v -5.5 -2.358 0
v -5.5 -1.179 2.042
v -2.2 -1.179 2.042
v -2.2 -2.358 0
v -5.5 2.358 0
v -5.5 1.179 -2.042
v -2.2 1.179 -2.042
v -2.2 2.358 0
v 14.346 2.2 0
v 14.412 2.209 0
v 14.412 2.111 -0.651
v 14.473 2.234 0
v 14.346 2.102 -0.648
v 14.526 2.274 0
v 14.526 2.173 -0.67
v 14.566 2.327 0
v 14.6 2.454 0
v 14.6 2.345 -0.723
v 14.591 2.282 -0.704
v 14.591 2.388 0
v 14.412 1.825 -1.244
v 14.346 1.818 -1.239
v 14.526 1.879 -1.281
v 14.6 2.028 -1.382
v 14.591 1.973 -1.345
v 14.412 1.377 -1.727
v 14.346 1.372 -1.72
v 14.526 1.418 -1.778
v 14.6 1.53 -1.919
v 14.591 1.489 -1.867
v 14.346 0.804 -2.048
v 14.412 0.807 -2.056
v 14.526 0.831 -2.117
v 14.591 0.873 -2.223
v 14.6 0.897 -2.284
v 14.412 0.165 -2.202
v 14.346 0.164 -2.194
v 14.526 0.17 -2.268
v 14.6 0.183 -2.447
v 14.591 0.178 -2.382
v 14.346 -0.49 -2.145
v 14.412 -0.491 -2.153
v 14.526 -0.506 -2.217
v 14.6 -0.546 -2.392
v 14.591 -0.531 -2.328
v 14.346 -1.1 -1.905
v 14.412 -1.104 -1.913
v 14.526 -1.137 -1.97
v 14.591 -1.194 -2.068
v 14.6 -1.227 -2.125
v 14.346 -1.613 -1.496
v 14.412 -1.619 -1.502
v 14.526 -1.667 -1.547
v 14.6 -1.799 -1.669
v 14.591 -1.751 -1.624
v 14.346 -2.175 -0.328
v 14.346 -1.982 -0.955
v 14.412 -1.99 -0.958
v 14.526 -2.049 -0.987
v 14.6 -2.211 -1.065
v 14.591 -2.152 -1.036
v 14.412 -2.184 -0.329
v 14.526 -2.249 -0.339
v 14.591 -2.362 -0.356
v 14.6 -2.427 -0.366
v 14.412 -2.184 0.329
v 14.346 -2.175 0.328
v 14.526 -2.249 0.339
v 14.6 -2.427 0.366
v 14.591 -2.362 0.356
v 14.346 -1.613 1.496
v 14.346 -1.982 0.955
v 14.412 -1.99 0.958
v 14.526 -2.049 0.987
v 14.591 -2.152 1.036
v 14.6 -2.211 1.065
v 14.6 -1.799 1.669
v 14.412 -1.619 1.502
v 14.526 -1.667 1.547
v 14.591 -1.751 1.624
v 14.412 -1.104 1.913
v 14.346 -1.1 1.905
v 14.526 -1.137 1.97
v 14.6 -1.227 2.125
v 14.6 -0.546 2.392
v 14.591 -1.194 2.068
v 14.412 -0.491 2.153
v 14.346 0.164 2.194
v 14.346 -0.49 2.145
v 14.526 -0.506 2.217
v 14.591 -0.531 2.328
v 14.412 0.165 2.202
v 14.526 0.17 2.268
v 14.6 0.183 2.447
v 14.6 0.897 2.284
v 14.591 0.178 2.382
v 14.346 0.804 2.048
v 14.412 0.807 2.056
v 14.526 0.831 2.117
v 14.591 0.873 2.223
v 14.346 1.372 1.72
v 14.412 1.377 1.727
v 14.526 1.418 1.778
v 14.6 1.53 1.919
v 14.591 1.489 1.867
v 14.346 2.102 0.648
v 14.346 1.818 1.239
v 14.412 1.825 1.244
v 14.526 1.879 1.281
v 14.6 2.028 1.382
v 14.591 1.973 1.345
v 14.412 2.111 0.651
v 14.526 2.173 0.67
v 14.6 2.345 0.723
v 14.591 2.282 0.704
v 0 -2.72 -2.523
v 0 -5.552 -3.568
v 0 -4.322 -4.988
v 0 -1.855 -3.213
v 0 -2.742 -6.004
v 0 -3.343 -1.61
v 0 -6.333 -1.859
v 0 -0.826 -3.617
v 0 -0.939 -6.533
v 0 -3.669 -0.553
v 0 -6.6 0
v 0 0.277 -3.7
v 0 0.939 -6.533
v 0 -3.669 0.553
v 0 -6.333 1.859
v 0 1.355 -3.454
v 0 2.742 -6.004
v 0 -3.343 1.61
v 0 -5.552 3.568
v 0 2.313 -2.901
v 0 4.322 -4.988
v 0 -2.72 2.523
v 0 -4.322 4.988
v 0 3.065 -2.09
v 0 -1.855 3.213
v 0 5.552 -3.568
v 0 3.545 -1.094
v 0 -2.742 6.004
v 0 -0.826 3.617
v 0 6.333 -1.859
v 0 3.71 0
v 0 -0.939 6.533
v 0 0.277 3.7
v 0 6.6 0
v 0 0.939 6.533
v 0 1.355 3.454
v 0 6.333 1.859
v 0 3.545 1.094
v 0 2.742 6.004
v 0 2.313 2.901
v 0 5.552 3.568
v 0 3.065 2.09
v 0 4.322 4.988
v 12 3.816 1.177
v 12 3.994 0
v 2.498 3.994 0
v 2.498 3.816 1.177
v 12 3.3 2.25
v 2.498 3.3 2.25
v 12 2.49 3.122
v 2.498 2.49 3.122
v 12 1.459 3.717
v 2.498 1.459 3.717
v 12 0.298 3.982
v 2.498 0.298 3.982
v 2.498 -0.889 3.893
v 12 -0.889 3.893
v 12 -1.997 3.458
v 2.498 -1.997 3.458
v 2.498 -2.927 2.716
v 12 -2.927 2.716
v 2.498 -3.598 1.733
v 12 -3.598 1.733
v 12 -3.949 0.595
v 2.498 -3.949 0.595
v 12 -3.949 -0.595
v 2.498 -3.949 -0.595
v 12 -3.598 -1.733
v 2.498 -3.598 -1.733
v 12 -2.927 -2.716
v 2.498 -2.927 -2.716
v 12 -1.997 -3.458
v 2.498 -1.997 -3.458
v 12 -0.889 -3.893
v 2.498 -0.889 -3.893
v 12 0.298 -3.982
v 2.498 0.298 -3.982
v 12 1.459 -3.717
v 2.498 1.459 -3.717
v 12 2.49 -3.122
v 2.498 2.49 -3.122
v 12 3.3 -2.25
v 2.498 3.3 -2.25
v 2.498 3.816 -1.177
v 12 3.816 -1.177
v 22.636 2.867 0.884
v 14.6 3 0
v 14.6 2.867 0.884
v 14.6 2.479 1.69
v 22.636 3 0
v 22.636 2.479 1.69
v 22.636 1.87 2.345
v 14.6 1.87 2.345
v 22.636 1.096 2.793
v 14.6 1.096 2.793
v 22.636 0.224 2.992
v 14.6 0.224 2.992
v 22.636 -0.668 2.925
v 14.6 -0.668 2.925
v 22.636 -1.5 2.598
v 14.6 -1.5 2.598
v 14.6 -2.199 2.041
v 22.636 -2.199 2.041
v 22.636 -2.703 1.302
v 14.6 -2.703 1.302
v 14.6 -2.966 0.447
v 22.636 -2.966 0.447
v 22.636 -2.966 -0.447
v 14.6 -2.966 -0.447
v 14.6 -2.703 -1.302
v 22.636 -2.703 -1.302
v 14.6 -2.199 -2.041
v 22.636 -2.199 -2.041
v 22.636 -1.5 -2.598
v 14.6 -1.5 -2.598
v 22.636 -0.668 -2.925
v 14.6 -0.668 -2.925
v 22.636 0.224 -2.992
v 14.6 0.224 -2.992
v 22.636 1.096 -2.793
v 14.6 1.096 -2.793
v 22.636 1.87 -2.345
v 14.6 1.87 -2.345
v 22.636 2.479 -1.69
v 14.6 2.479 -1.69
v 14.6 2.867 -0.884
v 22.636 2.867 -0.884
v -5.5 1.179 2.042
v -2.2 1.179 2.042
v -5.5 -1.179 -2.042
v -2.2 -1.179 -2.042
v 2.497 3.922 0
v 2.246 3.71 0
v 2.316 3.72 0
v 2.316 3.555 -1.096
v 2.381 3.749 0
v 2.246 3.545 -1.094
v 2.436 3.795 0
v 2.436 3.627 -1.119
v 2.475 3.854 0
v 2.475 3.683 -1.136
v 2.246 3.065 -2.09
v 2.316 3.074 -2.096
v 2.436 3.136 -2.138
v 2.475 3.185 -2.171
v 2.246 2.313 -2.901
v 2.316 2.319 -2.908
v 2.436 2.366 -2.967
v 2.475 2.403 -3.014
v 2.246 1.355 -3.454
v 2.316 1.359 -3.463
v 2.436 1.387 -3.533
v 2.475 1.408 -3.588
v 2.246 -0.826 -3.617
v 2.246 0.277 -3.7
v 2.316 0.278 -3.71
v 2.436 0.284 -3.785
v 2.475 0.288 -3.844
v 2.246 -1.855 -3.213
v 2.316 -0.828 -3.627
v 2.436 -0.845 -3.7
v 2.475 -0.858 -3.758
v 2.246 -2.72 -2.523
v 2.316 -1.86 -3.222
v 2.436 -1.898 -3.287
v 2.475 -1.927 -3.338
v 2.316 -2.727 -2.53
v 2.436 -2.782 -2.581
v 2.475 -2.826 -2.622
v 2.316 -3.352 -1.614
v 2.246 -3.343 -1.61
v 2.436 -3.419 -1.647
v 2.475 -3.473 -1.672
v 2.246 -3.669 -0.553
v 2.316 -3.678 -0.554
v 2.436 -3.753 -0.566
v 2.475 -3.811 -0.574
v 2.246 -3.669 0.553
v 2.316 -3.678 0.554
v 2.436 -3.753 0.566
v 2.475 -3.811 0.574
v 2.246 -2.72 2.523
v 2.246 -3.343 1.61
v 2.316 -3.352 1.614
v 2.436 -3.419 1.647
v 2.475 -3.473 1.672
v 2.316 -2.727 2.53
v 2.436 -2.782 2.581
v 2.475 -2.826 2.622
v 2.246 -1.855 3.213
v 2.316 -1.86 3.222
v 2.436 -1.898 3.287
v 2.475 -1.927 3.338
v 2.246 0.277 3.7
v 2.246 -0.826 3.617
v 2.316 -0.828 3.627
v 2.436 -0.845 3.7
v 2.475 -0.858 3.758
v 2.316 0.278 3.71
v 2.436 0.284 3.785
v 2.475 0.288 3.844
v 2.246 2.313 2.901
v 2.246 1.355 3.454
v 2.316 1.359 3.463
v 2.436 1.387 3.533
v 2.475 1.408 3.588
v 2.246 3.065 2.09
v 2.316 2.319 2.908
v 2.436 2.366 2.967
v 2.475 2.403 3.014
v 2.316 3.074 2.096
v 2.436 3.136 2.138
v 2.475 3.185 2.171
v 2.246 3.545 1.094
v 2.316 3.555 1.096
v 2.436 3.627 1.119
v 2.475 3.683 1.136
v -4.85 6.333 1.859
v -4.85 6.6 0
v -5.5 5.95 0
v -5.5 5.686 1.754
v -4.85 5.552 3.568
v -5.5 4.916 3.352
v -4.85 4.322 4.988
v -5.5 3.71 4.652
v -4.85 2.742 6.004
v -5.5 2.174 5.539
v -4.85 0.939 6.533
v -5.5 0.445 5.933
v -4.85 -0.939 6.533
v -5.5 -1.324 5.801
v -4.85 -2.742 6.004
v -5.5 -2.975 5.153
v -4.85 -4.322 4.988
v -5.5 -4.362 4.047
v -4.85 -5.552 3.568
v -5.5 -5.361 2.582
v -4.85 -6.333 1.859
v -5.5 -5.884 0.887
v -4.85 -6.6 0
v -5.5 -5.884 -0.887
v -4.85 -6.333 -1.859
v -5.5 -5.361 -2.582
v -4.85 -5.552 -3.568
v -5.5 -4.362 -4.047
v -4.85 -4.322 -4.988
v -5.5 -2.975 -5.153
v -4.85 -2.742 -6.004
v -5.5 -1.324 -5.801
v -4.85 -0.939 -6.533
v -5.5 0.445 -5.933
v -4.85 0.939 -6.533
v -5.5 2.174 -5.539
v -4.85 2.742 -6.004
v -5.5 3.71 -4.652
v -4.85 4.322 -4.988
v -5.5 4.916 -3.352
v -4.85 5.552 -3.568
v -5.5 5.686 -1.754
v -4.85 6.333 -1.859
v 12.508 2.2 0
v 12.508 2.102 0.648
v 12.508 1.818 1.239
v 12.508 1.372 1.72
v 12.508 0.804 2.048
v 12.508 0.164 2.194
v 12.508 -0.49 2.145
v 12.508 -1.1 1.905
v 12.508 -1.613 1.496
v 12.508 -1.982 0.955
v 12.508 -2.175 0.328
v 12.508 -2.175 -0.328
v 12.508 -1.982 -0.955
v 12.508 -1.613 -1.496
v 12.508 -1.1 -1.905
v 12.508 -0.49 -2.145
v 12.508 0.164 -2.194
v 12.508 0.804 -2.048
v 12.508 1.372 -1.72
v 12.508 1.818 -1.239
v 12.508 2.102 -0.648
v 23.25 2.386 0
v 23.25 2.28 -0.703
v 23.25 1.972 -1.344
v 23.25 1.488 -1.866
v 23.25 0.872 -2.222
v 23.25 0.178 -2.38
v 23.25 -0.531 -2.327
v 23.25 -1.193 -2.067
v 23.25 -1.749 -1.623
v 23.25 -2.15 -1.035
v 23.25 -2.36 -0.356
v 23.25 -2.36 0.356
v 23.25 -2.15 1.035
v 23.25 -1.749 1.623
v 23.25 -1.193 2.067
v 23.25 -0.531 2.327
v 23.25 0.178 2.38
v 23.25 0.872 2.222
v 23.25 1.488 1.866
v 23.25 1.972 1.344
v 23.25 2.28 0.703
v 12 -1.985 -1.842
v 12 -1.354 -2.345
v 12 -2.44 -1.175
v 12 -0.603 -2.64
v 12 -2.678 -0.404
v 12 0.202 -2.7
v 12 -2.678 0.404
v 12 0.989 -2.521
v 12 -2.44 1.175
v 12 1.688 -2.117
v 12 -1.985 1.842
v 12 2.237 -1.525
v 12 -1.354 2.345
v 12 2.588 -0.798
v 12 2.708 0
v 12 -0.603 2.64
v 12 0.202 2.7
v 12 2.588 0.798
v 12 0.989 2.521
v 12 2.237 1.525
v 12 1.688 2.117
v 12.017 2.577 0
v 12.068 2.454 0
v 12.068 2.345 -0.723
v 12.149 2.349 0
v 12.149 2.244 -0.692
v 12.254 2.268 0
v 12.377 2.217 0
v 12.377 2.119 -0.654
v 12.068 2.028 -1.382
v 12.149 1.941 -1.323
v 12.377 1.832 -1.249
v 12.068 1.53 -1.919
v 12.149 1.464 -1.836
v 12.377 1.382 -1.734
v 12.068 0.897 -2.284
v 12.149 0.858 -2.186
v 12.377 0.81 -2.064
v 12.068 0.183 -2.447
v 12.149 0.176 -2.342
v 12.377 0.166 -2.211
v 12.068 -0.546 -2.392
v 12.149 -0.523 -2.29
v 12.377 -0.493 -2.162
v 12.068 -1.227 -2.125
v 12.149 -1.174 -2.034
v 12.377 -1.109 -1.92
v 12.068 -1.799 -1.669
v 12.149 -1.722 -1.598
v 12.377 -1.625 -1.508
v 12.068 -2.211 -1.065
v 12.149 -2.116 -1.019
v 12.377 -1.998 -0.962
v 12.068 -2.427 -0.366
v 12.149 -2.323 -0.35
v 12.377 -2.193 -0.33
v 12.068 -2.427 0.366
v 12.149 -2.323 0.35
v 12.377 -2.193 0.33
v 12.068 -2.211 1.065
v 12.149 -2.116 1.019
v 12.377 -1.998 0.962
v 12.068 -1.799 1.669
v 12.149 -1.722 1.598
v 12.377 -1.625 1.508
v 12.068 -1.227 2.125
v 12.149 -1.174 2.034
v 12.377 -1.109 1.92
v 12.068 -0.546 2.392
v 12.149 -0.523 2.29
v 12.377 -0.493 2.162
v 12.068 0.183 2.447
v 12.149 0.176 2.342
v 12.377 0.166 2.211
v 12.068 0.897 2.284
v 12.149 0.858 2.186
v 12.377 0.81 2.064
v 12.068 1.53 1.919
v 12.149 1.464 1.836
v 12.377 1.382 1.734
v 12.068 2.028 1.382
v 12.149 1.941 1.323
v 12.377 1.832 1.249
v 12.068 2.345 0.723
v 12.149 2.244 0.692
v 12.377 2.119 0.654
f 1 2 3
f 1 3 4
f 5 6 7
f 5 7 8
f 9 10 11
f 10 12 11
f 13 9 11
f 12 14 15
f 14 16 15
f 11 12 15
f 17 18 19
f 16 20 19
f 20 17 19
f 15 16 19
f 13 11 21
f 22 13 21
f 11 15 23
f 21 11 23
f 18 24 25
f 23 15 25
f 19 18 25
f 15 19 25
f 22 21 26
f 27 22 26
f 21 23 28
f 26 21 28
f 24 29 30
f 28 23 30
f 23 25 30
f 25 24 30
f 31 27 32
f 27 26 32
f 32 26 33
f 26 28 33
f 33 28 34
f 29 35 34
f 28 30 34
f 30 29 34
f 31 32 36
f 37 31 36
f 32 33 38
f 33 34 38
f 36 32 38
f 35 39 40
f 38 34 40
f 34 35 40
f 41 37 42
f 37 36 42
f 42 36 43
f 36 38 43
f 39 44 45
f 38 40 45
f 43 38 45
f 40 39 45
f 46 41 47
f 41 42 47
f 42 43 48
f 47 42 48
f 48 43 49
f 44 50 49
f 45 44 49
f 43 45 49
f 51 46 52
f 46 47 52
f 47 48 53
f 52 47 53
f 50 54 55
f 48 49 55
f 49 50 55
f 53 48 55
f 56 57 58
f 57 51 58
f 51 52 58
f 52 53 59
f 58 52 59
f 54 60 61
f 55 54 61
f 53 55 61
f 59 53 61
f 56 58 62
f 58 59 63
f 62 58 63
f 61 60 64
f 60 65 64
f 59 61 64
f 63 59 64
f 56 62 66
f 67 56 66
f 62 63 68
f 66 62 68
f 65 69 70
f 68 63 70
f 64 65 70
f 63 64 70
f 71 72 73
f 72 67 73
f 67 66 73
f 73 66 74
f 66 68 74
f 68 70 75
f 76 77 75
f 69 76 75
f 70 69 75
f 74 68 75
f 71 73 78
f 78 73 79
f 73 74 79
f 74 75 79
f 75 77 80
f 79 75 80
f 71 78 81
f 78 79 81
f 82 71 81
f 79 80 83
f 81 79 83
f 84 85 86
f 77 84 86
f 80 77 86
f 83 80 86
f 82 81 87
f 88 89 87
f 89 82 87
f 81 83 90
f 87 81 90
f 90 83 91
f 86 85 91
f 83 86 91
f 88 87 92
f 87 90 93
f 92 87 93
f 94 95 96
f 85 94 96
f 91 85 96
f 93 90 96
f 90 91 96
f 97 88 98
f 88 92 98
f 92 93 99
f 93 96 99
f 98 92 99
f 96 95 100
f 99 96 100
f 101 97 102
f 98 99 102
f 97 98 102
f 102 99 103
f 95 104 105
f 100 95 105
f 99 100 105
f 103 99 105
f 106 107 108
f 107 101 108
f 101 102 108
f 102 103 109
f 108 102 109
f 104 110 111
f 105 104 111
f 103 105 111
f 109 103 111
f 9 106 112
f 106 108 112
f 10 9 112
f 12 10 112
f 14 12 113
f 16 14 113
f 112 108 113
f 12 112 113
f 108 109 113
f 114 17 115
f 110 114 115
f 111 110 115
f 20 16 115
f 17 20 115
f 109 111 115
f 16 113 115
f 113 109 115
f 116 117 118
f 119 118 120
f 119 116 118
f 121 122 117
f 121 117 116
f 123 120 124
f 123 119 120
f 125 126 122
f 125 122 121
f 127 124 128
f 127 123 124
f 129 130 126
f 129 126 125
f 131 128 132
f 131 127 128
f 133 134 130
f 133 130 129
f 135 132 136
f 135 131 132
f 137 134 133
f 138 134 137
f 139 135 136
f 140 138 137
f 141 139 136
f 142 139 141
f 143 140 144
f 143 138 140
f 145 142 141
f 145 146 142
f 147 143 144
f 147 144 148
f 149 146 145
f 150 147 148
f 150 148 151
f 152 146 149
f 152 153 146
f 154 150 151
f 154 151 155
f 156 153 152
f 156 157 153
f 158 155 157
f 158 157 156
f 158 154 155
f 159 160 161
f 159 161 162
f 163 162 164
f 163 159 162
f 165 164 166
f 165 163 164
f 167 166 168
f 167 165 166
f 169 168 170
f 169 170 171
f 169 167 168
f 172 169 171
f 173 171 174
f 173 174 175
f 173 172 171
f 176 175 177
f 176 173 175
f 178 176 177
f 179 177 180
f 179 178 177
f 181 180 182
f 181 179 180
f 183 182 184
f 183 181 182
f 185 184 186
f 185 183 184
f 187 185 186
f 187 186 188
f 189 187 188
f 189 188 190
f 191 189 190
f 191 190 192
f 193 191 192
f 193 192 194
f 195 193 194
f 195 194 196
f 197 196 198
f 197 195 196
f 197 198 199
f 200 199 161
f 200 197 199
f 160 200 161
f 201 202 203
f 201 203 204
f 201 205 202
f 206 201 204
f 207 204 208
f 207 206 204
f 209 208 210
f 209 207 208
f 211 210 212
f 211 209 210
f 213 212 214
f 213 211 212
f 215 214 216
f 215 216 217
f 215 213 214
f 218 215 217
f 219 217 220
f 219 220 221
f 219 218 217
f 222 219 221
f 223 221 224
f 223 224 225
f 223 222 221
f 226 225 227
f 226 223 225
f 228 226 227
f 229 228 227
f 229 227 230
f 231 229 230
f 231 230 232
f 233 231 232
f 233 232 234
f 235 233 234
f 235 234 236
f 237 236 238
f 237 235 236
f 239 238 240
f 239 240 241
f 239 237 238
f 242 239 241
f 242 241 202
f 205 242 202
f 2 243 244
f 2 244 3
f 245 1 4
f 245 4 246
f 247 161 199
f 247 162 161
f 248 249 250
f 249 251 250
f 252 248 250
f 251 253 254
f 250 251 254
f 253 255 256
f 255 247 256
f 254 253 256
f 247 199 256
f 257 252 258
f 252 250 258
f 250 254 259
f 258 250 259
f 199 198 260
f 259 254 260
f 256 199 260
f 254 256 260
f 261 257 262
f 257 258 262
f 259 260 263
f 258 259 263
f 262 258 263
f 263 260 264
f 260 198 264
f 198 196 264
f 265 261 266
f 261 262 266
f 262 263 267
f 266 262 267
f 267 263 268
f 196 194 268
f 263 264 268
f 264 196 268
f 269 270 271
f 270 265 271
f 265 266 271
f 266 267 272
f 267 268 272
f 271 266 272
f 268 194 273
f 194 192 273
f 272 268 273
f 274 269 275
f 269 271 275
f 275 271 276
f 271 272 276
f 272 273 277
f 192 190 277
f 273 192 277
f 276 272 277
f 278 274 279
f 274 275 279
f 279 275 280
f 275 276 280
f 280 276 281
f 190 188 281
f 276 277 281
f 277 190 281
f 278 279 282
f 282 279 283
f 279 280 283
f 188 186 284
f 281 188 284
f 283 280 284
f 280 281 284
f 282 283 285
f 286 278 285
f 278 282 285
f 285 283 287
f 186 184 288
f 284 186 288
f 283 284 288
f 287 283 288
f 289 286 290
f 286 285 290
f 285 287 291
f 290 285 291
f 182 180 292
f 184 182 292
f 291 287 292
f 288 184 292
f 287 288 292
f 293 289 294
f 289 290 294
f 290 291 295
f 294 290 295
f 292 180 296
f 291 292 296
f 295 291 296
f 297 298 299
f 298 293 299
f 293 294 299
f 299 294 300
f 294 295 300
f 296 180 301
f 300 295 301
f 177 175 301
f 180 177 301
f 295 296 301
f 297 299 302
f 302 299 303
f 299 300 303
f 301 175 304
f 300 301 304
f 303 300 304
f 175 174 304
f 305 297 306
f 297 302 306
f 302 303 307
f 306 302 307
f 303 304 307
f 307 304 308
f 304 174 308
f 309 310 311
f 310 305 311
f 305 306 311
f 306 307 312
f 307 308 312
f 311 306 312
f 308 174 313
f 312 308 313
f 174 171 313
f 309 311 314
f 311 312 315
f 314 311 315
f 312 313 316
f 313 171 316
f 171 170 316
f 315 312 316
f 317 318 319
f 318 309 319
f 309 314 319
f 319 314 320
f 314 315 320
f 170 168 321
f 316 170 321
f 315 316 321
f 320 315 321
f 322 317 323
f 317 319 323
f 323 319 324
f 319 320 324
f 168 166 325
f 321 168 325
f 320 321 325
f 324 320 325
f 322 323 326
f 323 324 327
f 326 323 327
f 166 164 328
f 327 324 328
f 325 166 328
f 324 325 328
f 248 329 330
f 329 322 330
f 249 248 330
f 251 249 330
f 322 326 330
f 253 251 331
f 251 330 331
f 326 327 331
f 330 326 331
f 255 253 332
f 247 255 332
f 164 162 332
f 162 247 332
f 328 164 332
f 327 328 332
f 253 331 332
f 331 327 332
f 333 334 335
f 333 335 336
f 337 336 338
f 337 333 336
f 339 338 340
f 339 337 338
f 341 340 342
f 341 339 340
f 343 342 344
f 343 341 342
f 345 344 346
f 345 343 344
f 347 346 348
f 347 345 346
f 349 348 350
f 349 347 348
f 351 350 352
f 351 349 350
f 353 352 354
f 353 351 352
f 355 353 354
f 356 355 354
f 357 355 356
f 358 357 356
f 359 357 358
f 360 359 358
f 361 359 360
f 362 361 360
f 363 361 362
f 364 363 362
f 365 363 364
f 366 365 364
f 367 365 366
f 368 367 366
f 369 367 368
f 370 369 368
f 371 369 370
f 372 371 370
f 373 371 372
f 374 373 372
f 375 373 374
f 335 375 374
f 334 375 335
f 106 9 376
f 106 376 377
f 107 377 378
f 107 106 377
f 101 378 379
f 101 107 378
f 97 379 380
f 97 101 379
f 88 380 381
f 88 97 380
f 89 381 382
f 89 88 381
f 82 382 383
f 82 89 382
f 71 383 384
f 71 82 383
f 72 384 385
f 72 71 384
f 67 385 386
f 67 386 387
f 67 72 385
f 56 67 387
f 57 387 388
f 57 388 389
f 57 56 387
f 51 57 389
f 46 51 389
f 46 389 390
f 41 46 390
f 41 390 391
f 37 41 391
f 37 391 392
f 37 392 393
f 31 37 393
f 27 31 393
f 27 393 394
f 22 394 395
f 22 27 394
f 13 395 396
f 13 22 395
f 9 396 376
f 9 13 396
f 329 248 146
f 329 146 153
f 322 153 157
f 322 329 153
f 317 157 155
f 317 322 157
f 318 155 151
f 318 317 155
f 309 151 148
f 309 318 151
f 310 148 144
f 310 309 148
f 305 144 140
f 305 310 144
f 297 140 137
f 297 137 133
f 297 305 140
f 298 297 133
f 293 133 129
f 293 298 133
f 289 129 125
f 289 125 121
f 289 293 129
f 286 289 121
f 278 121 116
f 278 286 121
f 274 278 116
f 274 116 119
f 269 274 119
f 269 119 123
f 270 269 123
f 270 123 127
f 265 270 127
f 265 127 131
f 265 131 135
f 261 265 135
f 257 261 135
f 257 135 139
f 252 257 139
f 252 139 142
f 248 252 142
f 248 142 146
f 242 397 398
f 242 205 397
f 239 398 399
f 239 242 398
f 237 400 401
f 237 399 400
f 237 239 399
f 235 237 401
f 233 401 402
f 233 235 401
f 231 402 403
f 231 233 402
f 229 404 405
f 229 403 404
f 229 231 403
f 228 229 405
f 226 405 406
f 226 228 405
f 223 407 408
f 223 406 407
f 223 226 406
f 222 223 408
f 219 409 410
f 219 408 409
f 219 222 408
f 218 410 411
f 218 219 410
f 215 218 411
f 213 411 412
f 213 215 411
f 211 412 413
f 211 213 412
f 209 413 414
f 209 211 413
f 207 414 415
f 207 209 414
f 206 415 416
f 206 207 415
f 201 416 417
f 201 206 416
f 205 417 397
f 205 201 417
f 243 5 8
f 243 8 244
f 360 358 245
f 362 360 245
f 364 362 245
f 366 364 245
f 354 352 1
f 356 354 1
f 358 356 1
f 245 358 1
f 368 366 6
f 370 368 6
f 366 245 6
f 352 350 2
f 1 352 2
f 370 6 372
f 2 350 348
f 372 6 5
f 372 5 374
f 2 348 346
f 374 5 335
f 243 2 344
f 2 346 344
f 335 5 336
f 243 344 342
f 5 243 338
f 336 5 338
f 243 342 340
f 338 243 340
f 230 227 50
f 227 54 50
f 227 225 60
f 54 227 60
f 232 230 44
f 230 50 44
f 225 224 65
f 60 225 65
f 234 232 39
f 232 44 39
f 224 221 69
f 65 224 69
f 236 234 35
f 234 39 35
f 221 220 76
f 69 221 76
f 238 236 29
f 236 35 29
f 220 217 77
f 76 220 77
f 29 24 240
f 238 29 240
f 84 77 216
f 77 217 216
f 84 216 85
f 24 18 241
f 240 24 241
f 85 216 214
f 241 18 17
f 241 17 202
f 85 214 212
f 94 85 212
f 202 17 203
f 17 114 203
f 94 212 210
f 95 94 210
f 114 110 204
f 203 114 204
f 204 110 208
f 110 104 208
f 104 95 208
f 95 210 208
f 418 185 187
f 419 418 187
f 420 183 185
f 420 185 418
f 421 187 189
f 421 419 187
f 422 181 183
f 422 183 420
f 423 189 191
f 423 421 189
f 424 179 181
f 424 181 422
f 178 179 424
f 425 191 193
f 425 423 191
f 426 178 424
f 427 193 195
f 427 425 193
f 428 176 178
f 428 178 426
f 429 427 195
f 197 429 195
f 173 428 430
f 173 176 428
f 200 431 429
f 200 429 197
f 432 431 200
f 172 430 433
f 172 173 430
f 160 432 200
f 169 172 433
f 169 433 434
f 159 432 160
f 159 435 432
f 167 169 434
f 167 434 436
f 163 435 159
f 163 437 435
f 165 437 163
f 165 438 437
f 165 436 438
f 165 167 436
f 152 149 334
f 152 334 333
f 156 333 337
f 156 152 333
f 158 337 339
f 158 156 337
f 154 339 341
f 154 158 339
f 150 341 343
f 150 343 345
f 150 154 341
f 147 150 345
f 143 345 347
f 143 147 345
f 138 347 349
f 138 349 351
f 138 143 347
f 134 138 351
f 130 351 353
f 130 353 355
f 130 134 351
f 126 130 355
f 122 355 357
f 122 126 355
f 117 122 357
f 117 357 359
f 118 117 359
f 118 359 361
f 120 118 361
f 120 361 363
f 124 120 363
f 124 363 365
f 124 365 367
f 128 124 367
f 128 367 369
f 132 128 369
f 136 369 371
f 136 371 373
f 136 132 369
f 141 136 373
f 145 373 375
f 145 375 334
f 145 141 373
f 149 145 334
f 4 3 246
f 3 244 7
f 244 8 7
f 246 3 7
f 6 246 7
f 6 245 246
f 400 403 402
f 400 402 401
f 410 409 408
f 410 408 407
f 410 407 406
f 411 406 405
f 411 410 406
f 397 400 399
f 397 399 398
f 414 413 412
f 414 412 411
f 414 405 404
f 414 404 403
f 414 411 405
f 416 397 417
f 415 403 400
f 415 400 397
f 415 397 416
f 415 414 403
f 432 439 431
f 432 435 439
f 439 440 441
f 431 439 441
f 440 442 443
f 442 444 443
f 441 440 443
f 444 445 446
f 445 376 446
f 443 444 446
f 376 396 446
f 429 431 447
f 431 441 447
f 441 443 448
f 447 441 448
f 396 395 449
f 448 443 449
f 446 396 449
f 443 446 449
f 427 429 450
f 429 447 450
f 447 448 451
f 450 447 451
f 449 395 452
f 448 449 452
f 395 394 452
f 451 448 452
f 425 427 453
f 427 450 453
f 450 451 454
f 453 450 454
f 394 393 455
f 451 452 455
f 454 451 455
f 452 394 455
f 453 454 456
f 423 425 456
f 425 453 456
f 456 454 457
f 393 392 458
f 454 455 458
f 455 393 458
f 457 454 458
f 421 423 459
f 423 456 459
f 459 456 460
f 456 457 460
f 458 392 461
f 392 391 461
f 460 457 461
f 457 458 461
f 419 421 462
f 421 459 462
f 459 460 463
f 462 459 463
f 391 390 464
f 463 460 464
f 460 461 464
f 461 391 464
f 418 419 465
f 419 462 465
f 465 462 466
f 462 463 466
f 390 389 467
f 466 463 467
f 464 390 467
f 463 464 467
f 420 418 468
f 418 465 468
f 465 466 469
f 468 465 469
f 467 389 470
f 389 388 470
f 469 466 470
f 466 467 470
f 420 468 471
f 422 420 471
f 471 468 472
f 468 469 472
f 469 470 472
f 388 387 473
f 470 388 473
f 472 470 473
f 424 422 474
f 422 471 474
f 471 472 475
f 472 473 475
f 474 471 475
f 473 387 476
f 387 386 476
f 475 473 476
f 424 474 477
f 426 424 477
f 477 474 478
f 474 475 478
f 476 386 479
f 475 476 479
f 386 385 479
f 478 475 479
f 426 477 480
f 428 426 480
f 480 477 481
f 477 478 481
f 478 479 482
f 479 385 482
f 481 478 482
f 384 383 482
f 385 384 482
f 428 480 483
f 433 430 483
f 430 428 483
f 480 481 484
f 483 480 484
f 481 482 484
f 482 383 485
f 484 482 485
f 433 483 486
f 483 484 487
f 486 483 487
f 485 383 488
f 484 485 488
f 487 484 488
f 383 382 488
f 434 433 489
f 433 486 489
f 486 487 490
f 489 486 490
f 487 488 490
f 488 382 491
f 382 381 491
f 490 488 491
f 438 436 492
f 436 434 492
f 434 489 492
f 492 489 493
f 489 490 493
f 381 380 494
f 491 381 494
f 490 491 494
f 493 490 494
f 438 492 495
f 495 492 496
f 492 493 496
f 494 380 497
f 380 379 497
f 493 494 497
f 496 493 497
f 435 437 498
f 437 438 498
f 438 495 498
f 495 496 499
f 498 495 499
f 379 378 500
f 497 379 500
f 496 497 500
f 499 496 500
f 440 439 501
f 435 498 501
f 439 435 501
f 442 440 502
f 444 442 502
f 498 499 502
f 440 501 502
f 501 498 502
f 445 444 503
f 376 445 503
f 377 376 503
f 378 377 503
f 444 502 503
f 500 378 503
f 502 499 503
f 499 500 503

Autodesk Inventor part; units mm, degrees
sketch "Sketch_1" plane through (0, 0, 0) normal (0, 0, 1) x (1, 0, 0)
  line L0 (23.25, 0) -> (-5.5, 0)
  line L1 (-5.5, 0) -> (-5.5, 5.95)
  line L2 (-5.5, 5.95) -> (-4.85, 6.6)
  line L3 (-4.85, 6.6) -> (0, 6.6)
  line L4 (0, 6.6) -> (0, 3.71)
  line L5 (0, 3.71) -> (2.246, 3.71)
  arc A0 (2.246, 3.71) -> (2.4983, 3.9935) centre (2.246, 3.964) ccw
  line L6 (2.4983, 3.9935) -> (12, 3.9935)
  line L7 (12, 3.9935) -> (12, 2.708)
  arc A1 (12, 2.708) -> (12.508, 2.2) centre (12.508, 2.708) ccw
  line L8 (12.508, 2.2) -> (14.346, 2.2)
  arc A2 (14.346, 2.2) -> (14.6, 2.454) centre (14.346, 2.454) ccw
  line L9 (14.6, 2.454) -> (14.6, 3)
  line L10 (14.6, 3) -> (22.6365, 3)
  line L11 (22.6365, 3) -> (23.25, 2.3865)
  line L12 (23.25, 2.3865) -> (23.25, 0)
  line L13 (23.25, 0) -> (-5.5, 0)
revolve "Revolution1" add sketch "Sketch_1" angle 360 about axis through (23.25, 0, 0) along (1, 0, 0)
thread "Thread1" size "M6x1" class "6g" standard "ISO Metric profile" full length
sketch "Sketch_5" plane through (-5.5, 0, 0) normal (1, 0, 0) x (0, 0, -1)
  line L0 (-2.042, -1.1789) -> (0, -2.3579)
  line L1 (0, -2.3579) -> (2.042, -1.1789)
  line L2 (2.042, -1.1789) -> (2.042, 1.1789)
  line L3 (2.042, 1.1789) -> (0, 2.3579)
  line L4 (0, 2.3579) -> (-2.042, 1.1789)
  line L5 (-2.042, 1.1789) -> (-2.042, -1.1789)
extrude "Extrusion1" cut sketch "Sketch_5" along normal blind 3.3
ref_plane "bolt_XY" through (0, 0, 0) normal (1, 0, 0) x (0, 0, -1)
ref_plane "bolt_YZ" through (0, 0, 0) normal (0, 0, -1) x (0, 1, 0)
ref_plane "bolt_ZX" through (0, 0, 0) normal (0, 1, 0) x (1, 0, 0)
ref_plane "bolt1_XY" through (15.2, 0, 0) normal (1, 0, 0) x (0, 0, -1)
ref_plane "bolt1_YZ" through (15.2, 0, 0) normal (0, 0, -1) x (0, 1, 0)
ref_plane "bolt1_ZX" through (15.2, 0, 0) normal (0, 1, 0) x (1, 0, 0)
properties part number "25-2281_b"
